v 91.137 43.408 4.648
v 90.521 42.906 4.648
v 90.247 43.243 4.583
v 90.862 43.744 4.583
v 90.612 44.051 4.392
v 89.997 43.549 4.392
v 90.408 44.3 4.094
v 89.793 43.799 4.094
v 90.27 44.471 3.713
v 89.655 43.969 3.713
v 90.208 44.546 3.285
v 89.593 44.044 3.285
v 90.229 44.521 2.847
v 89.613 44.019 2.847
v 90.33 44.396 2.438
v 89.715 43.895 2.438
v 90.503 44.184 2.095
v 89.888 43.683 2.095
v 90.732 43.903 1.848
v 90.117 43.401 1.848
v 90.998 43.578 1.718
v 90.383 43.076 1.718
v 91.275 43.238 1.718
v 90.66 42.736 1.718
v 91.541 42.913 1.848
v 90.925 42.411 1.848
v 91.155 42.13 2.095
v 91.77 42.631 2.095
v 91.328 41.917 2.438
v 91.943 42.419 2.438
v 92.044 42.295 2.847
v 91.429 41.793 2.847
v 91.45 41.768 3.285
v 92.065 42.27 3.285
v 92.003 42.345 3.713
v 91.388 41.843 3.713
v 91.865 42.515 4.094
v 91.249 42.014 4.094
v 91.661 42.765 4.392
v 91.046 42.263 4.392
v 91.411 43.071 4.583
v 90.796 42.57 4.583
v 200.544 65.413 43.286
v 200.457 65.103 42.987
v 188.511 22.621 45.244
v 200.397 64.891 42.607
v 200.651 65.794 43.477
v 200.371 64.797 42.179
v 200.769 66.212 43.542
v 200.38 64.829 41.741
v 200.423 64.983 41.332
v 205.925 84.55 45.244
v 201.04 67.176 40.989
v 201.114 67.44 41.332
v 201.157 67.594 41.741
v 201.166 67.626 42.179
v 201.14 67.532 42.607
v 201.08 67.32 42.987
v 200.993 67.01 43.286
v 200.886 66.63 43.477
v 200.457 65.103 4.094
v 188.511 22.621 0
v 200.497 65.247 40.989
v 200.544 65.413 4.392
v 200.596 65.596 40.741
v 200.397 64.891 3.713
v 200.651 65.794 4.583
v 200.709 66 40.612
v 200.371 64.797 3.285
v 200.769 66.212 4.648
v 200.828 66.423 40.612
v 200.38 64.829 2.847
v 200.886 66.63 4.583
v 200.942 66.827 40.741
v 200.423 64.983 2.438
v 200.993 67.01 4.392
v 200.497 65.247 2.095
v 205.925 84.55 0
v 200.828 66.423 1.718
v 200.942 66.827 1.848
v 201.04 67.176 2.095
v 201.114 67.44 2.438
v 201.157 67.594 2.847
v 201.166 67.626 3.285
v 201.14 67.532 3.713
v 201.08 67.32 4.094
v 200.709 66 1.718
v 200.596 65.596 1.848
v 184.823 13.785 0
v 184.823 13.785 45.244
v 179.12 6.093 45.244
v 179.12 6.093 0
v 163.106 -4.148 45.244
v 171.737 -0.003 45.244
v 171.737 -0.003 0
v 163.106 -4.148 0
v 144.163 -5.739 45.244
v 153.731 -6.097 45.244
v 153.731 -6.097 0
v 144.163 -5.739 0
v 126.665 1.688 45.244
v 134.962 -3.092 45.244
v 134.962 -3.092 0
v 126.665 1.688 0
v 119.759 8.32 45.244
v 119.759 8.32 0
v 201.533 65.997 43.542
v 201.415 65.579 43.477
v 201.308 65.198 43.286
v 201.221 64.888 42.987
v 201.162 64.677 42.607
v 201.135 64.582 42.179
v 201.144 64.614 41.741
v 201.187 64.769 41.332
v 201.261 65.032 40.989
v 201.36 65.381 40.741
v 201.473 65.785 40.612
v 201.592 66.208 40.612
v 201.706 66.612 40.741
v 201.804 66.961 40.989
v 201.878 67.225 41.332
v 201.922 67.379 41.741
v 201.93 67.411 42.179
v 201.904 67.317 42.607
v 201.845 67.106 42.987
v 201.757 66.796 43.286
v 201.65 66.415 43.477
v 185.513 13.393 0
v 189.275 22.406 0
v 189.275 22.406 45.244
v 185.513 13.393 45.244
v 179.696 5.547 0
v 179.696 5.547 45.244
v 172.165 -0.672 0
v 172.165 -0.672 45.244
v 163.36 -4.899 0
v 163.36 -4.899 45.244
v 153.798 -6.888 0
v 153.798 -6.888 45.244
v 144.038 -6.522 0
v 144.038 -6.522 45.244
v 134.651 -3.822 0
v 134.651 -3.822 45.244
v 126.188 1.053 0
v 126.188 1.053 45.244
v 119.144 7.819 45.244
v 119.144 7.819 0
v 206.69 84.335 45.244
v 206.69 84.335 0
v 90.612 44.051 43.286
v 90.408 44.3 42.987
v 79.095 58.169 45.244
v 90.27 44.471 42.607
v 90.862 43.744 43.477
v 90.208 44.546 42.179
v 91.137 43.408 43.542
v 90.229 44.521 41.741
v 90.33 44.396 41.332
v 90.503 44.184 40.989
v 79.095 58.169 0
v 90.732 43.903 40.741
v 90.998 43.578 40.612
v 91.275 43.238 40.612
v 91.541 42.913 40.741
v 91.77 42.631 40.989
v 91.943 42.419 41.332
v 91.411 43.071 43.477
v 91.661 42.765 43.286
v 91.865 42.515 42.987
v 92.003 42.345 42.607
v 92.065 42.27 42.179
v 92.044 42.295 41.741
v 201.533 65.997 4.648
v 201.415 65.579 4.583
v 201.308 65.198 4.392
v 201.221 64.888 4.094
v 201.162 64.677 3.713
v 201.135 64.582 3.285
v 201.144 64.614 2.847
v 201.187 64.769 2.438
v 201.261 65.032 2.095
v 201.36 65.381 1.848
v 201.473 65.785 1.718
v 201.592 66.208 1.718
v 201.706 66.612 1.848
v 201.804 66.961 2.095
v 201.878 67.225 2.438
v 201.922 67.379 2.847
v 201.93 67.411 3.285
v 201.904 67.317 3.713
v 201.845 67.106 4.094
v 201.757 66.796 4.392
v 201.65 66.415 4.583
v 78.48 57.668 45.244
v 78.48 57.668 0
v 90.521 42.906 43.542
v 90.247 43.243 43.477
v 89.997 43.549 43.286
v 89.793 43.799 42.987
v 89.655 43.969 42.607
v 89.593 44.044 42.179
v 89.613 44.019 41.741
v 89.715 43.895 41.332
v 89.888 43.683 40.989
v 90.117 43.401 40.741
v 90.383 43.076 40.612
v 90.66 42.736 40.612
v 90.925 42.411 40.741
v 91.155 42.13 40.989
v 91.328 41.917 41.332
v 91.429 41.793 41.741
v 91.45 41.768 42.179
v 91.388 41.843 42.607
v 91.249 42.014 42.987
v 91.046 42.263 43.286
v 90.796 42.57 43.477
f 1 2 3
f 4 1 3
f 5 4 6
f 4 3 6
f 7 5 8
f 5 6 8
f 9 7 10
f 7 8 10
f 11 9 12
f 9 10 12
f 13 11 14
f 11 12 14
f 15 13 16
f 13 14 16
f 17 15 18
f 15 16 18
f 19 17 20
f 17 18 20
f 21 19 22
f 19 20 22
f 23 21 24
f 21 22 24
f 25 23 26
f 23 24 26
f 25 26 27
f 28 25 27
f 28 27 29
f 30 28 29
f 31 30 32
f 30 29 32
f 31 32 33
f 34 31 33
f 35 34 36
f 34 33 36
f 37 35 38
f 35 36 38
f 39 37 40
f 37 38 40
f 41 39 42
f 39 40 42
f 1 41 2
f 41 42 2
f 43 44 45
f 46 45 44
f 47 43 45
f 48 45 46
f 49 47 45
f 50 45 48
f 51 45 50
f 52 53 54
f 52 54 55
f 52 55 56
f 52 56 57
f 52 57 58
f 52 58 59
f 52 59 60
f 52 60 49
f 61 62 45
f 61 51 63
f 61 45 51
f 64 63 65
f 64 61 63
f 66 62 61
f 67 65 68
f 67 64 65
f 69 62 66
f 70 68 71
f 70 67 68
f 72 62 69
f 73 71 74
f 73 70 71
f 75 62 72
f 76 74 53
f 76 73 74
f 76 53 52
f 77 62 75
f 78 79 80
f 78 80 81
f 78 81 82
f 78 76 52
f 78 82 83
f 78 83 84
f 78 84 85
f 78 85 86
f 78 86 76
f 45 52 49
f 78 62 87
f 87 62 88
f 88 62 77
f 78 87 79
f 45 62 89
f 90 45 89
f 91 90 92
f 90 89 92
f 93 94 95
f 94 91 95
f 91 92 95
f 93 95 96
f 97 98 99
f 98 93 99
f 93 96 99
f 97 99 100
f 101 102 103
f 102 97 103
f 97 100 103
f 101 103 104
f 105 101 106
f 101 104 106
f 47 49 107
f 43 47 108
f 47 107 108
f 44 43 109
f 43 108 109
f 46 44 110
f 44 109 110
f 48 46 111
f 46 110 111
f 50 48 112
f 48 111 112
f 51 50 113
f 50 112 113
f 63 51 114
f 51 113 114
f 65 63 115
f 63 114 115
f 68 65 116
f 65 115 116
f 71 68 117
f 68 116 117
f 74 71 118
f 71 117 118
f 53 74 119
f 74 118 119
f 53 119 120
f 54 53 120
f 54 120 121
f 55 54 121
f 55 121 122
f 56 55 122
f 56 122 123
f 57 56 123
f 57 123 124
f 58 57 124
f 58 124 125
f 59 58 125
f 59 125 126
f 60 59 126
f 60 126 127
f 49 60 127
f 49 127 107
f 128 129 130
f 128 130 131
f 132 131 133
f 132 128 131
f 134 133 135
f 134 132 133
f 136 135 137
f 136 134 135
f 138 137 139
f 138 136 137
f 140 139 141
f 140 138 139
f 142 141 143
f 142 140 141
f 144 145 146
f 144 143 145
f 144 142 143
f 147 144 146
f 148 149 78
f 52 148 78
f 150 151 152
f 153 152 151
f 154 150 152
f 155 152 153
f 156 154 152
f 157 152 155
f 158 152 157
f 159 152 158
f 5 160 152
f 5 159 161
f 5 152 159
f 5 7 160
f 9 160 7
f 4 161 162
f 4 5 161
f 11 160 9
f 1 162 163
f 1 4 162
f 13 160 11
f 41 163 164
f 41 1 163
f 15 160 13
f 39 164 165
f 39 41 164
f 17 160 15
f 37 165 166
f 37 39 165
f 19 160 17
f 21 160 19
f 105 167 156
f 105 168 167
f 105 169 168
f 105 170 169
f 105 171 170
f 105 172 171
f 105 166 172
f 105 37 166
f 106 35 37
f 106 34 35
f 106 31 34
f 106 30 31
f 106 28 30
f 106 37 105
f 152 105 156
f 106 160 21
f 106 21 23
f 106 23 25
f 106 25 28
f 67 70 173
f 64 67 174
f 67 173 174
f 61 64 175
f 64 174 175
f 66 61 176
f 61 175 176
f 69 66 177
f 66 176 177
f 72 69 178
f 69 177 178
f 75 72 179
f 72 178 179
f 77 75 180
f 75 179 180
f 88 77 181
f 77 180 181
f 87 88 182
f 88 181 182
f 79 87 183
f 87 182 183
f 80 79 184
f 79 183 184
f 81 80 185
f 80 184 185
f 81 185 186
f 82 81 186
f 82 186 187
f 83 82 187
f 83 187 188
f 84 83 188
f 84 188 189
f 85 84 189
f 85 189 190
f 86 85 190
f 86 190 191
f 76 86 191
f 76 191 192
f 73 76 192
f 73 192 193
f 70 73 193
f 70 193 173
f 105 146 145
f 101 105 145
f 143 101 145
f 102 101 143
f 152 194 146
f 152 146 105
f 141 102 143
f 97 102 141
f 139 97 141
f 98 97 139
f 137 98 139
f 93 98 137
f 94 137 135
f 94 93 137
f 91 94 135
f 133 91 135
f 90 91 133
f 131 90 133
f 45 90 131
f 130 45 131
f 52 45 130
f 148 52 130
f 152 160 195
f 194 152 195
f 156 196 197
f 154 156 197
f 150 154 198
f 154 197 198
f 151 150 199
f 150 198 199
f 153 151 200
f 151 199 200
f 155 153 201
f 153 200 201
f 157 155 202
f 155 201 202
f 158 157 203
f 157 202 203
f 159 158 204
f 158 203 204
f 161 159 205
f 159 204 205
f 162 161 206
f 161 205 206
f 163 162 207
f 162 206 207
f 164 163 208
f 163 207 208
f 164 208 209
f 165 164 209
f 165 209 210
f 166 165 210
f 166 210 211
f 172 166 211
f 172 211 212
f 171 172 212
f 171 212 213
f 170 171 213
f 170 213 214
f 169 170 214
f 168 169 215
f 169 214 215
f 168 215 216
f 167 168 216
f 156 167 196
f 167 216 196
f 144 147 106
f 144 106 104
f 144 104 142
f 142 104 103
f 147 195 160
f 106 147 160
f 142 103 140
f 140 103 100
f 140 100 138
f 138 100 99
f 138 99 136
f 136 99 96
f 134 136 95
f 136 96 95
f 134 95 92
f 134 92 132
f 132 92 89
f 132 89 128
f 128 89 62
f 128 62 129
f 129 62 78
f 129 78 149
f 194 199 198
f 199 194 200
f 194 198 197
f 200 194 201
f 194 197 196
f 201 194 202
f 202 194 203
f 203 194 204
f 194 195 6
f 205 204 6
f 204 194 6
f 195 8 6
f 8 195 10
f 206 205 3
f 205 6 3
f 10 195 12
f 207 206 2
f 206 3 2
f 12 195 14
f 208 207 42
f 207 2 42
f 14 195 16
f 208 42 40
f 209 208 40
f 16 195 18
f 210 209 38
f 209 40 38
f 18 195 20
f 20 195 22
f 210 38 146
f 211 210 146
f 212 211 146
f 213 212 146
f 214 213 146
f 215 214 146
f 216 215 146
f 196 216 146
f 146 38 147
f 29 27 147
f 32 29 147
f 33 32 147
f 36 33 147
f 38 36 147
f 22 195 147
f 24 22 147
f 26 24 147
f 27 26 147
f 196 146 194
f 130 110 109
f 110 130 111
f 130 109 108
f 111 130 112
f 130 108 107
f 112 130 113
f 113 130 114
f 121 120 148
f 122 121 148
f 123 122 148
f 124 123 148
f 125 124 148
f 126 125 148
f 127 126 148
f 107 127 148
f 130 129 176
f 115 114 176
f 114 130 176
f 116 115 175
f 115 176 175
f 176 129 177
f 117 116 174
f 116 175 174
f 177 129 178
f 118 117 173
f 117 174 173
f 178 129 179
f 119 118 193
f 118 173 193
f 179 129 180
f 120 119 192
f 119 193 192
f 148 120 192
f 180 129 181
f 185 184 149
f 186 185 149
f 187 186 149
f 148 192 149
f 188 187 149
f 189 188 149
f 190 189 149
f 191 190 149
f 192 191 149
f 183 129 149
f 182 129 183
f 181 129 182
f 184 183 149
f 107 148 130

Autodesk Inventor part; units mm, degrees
ref_plane "YZ Plane" through (0, 0, 0) normal (1, 0, 0) x (0, 1, 0)
ref_plane "XZ Plane" through (0, 0, 0) normal (0, 1, 0) x (-1, 0, 0)
sketch "Main Outline" plane through (0, 0, 0) normal (0, 0, 1) x (1, 0, 0)
  line L0 (0, 0) -> (304.8, 0) construction
  line L1 (304.8, 0) -> (304.8, 50.8) construction
  line L2 (304.8, 50.8) -> (0, 50.8) construction
  line L3 (0, 50.8) -> (0, 0) construction
  line L4 (0, 50.8) -> (0, 53.34) construction
  line L5 (0, 53.34) -> (304.8, 53.34) construction
  line L6 (304.8, 53.34) -> (304.8, 50.8) construction
  circle A0 centre (152.4, 23.8125) radius 17.4625 construction
  line L7 (152.4, 23.8125) -> (152.4, 0) construction
  circle A1 centre (152.4, 23.8125) radius 27.94 construction
  circle A2 centre (152.4, 23.8125) radius 21.59 construction
  line L8 (152.4, 23.8125) -> (144.7964, 60.3681) construction
  circle A3 centre (144.7964, 60.3681) radius 15.24 construction
  circle A4 centre (144.7964, 60.3681) radius 8.89 construction
  circle A5 centre (144.7964, 60.3681) radius 14.2875 construction
  arc A6 (164.6591, 71.8014) -> (129.0153, 43.7486) centre (144.7964, 60.3681) ccw construction
  circle A7 centre (98.8106, 85.598) radius 32.258 construction
  circle A8 centre (126.6733, 147.4971) radius 32.258 construction
  circle A9 centre (176.9075, 101.8424) radius 32.258 construction
  circle A10 centre (144.7964, 60.3681) radius 11.1125 construction
  circle A11 centre (152.4, 23.8125) radius 49.53 construction
  line L9 (144.7964, 60.3681) -> (126.6733, 147.4971) construction
  line L10 (144.7964, 60.3681) -> (98.8106, 85.598) construction
  line L11 (98.8106, 85.598) -> (176.9075, 101.8424) construction
  line L12 (176.9075, 101.8424) -> (144.7964, 60.3681) construction
  circle A12 centre (98.8106, 85.598) radius 9.5493 construction
  arc A13 (174.9629, 111.1915) -> (185.6989, 98.1139) centre (176.9075, 101.8424) ccw construction
  circle A14 centre (126.6733, 147.4971) radius 9.5493 construction
  line L13 (96.8659, 94.9472) -> (174.9629, 111.1915) construction
  line L14 (185.6989, 98.1139) -> (165.8956, 51.4198) construction
  line L15 (92.2351, 78.6732) -> (129.0153, 43.7486) construction
  line L16 (174.9629, 111.1915) -> (176.9075, 101.8424) construction
  line L17 (176.9075, 101.8424) -> (185.6989, 98.1139) construction
  arc A15 (185.6989, 98.1139) -> (174.9629, 111.1915) centre (176.9075, 101.8424) ccw construction
  arc A16 (165.8956, 51.4198) -> (164.6591, 71.8014) centre (144.7964, 60.3681) ccw construction
  arc A17 (129.0153, 43.7486) -> (165.8956, 51.4198) centre (144.7964, 60.3681) ccw construction
  circle A18 centre (126.6086, 147.808) radius 32.258 construction
  circle A19 centre (126.544, 148.1188) radius 32.258 construction
  circle A20 centre (126.4793, 148.4297) radius 32.258 construction
  line L18 (126.6733, 147.4971) -> (126.4793, 148.4297) construction
  circle A21 centre (126.738, 147.1863) radius 32.258 construction
  circle A22 centre (117.4622, 43.2997) radius 9.525 construction
  circle A23 centre (176.6694, 55.615) radius 9.525 construction
  line L19 (152.4, 23.8125) -> (117.4622, 43.2997) construction
  line L20 (152.4, 23.8125) -> (176.6694, 55.615) construction
  line L21 (117.4622, 43.2997) -> (98.8106, 85.598) construction
  line L22 (176.6694, 55.615) -> (176.9075, 101.8424) construction
  circle A24 centre (135.1821, 106.5897) radius 7.9375 construction
  line L23 (135.6243, 150.8242) -> (166.2787, 68.353) construction
  circle A25 centre (152.4, 23.8125) radius 29.845 construction
  line L24 (117.1381, 146.979) -> (121.9118, 59.1246) construction
  circle A26 centre (99.0889, 85.4453) radius 32.258 construction
  circle A27 centre (97.9755, 86.0562) radius 32.258 construction
  line L25 (97.9755, 86.0562) -> (98.8106, 85.598) construction
  circle A28 centre (98.2538, 85.9034) radius 32.258 construction
  circle A29 centre (98.5322, 85.7507) radius 32.258 construction
  circle A30 centre (152.4, 23.8125) radius 29.845 construction
  circle A31 centre (122.555, 23.8125) radius 6.35 construction
  circle A32 centre (179.7696, 35.7133) radius 6.35 construction
  line L26 (122.555, 23.8125) -> (152.4, 23.8125) construction
  line L27 (152.4, 23.8125) -> (182.245, 23.8125) construction
  circle A33 centre (182.245, 23.8125) radius 6.35 construction
  circle A34 centre (125.0304, 11.9117) radius 6.35 construction
  circle A35 centre (150.4199, 33.3321) radius 39.5684 construction
  line L28 (72.9795, 65.6655) -> (119.7593, 8.3204) construction
  circle A36 centre (177.4906, 102.5955) radius 32.258 construction
  line L29 (176.9075, 101.8424) -> (177.4906, 102.5955) construction
  circle A37 centre (177.2963, 102.3445) radius 32.258 construction
  circle A38 centre (177.1019, 102.0934) radius 32.258 construction
  circle A39 centre (176.7131, 101.5913) radius 32.258 construction
  line L30 (188.5109, 22.6209) -> (208.5442, 93.8632) construction
  circle A40 centre (135.1821, 106.5897) radius 9.5727 construction
  arc A41 (86.8202, 116.3239) -> (96.3065, 136.4856) centre (81.3304, 131.2195) ccw construction
  arc A42 (158.9123, 149.5077) -> (175.6513, 134.801) centre (174.7462, 150.6502) ccw construction
  line L31 (126.4793, 148.4297) -> (126.9966, 145.9429) construction
  line L32 (116.5322, 146.3607) -> (117.0495, 143.8739) construction
  line L33 (136.9437, 148.0119) -> (136.4264, 150.4987) construction
  arc A43 (136.4264, 150.4987) -> (116.5322, 146.3607) centre (126.4793, 148.4297) ccw construction
  arc A44 (117.0495, 143.8739) -> (136.9437, 148.0119) centre (126.9966, 145.9429) ccw construction
  line L34 (177.4906, 102.5955) -> (175.9357, 100.5871) construction
  line L35 (169.4571, 108.8154) -> (167.9021, 106.807) construction
  line L36 (183.9692, 94.3672) -> (185.5242, 96.3756) construction
  arc A45 (185.5242, 96.3756) -> (169.4571, 108.8154) centre (177.4906, 102.5955) ccw construction
  arc A46 (167.9021, 106.807) -> (183.9692, 94.3672) centre (175.9357, 100.5871) ccw construction
  line L37 (97.9755, 86.0562) -> (100.2023, 84.8344) construction
  line L38 (93.0884, 77.1487) -> (95.3153, 75.927) construction
  line L39 (105.0894, 93.7418) -> (102.8625, 94.9636) construction
  arc A47 (102.8625, 94.9636) -> (93.0884, 77.1487) centre (97.9755, 86.0562) ccw construction
  arc A48 (95.3153, 75.927) -> (105.0894, 93.7418) centre (100.2023, 84.8344) ccw construction
  circle A49 centre (117.4622, 43.2997) radius 3.9687 construction
  circle A50 centre (176.6694, 55.615) radius 3.9687 construction
  line L40 (152.4, 23.8125) -> (158.4777, -5.4071) construction
  arc A51 (80.1751, 59.3139) -> (79.0947, 58.1692) centre (79.7097, 58.6709) ccw construction
  arc A52 (205.9254, 84.5503) -> (204.4781, 85.1692) centre (205.1613, 84.7652) ccw construction
  circle A53 centre (152.4, 23.8125) radius 14.224 construction
  circle A54 centre (135.1821, 106.5897) radius 3.9687 construction
  circle A55 centre (156.538, 3.9183) radius 6.35 construction
  circle A56 centre (156.538, 3.9183) radius 2.0828 construction
  circle A57 centre (152.4, 23.8125) radius 20.32 construction
  line L41 (133.1021, 30.1759) -> (152.4, 23.8125) construction
  line L42 (152.4, 23.8125) -> (167.5599, 37.3432) construction
  circle A58 centre (167.5599, 37.3432) radius 2.0828 construction
  circle A59 centre (167.5599, 37.3432) radius 3.9687 construction
  circle A60 centre (133.1021, 30.1759) radius 2.0828 construction
  circle A61 centre (133.1021, 30.1759) radius 3.9688 construction
  point P0 (126.738, 147.1863)
  point P1 (176.7131, 101.5913)
  dimension "d18" = 99.06
  dimension "d58" = 64.516
  dimension "d86" = 64.516
  dimension "d0" = 304.8
  dimension "d1" = 50.8
  dimension "d2" = 2.54
  dimension "d3" = 34.925
  dimension "d4" = 23.8125
  dimension "d5" = 152.4
  dimension "d6" = 55.88
  dimension "d7" = 43.18
  dimension "d8" = 37.338
  dimension "d10" = 30.48
  dimension "d11" = 17.78
  dimension "d12" = 28.575
  dimension "d13" = 45.8366
  dimension "d14" = 64.516
  dimension "d15" = 64.516
  dimension "d16" = 64.516
  dimension "d17" = 22.225
  dimension "d19" = 52.4523
  dimension "d20" = 88.9939
  dimension "d21" = 19.0986
  dimension "d22" = 19.0986
  dimension "d23" = 19.0986
  dimension "d30" = 124.732
  dimension "d40" = 64.516
  dimension "d41" = 64.516
  dimension "d42" = 64.516
  dimension "d43" = 0.9525
  dimension "d44" = 0.3175
  dimension "d45" = 0.635
  dimension "d46" = 64.516
  dimension "d47" = 0.3175
  dimension "d48" = 19.05
  dimension "d49" = 19.05
  dimension "d50" = 40.005
  dimension "d51" = 40.005
  dimension "d52" = 46.228
  dimension "d54" = 46.228
  dimension "d55" = 15.875
  dimension "d56" = 41.4655
  dimension "d57" = 59.69
  dimension "d59" = 64.516
  dimension "d60" = 64.516
  dimension "d61" = 64.516
  dimension "d62" = 0.3175
  dimension "d63" = 0.3175
  dimension "d64" = 0.635
  dimension "d65" = 0.9525
  dimension "d73" = 12.7
  dimension "d74" = 12.7
  dimension "d76" = 59.69
  dimension "d78" = 12.7
  dimension "d79" = 12.7
  dimension "d80" = 64.516
  dimension "d81" = 0.9525
  dimension "d82" = 64.516
  dimension "d83" = 64.516
  dimension "d84" = 0.3175
  dimension "d85" = 0.635
  dimension "d88" = 0.3175
  dimension "d89" = 31.75
  dimension "d90" = 31.75
  dimension "d94" = 1.5875
  dimension "d95" = 20.32
  dimension "d96" = 1.5875
sketch "Upper CIM C-C Check" plane through (0, 0, 0) normal (0, 0, 1) x (1, 0, 0)
  arc A0 (3.4429, -22.6582) -> (3.4429, 22.6582) centre (0, 0) ccw construction
  arc A1 (90.4285, 9.4409) -> (90.4285, -9.4409) centre (88.9939, 0) ccw construction
  line L0 (88.9939, 0) -> (0, 0) construction
  line L1 (90.4285, 9.4409) -> (3.4429, 22.6582)
  line L2 (3.4429, -22.6582) -> (90.4285, -9.4409)
  arc A2 (90.4285, -9.4409) -> (90.4285, 9.4409) centre (88.9939, 0) ccw
  arc A3 (3.4429, 22.6582) -> (3.4429, -22.6582) centre (0, 0) ccw
  dimension "d24" = 45.8366
  dimension "d25" = 19.0986
  dimension "d26" = 78.9119
  dimension "d27" = 87.984
  dimension "d28" = 27.12
  dimension "d29" = 88.9939
sketch "Sketch3" plane through (0, 0, 0) normal (0, 0, 1) x (1, 0, 0)
  arc A0 (80.1751, 59.3139) -> (79.0947, 58.1692) centre (79.7097, 58.6709) ccw construction
  line L0 (72.9795, 65.6655) -> (119.7593, 8.3204) construction
  circle A1 centre (150.4199, 33.3321) radius 39.5684 construction
  line L1 (188.5109, 22.6209) -> (208.5442, 93.8632) construction
  arc A2 (205.9254, 84.5503) -> (204.4781, 85.1692) centre (205.1613, 84.7652) ccw construction
  line L2 (79.0947, 58.1692) -> (119.7593, 8.3204)
  line L3 (188.5109, 22.6209) -> (205.9254, 84.5503)
  arc A3 (119.7593, 8.3204) -> (188.5109, 22.6209) centre (150.4199, 33.3321) ccw
  line L4 (78.4796, 57.6675) -> (119.1442, 7.8187)
  arc A4 (119.1442, 7.8187) -> (189.275, 22.4061) centre (150.4199, 33.3321) ccw
  line L5 (189.275, 22.4061) -> (206.6896, 84.3354)
  line L6 (79.0947, 58.1692) -> (78.4796, 57.6675)
  line L7 (206.6896, 84.3354) -> (205.9254, 84.5503)
  point P0 (0, 0)
  dimension "d115" = 0.7937
extrude "Extrusion1" add sketch "Sketch3" along normal blind 45.2437
ref_plane "Work Plane1" through (144.7964, 60.3681, 0) normal (0.9790451, 0.2036437, 0) x (-0.2036437, 0.9790451, 0)
sketch "Sketch4" plane through (188.5109, 22.6209, 0) normal (-0.9626636, 0.2707007, 0) x (0, 0, 1)
  line L0 (0, 0) -> (0, 64.3313) projected
  line L1 (0, 0) -> (45.2437, 0) projected
  line L2 (45.2437, 64.3313) -> (45.2437, 0) projected
  line L3 (0, 64.3313) -> (45.2437, 64.3313) projected
  line L4 (3.175, 64.3313) -> (3.175, 0)
  line L5 (42.0688, 64.3313) -> (42.0688, 0)
  point P0 (0, -72.8064)
  point P1 (3.175, 45.2813)
  point P2 (42.0688, 45.2813)
  dimension "d119" = 3.175
  dimension "d120" = 3.175
  dimension "d121" = 19.05
  dimension "d122" = 19.05
hole "Hole1" at (200.7686, 66.2116, 3.175) at (200.7686, 66.2116, 42.0688) direction (0.9626636, -0.2707007, 0) diameter 2.9464 end through all clearance for "Flat Head Machine Screw (82)" size "#4" standard "Ansi Unified Screw Threads"
mirror "Mirror1" about plane through (144.7964, 60.3681, 0) normal (0.9790451, 0.2036437, 0) of "Hole1"
sketch "Sketch6" plane through (0, 0, 45.2437) normal (0, 0, 1) x (1, 0, 0)
  line L0 (119.7593, 8.3204) -> (79.0947, 58.1692) projected
  line L1 (79.0947, 58.1692) -> (78.4796, 57.6675) projected
  line L2 (78.4796, 57.6675) -> (119.1442, 7.8187) projected
  arc A0 (119.1442, 7.8187) -> (189.275, 22.4061) centre (150.4199, 33.3321) ccw projected
  line L3 (189.275, 22.4061) -> (206.6896, 84.3354) projected
  line L4 (206.6896, 84.3354) -> (205.9254, 84.5503) projected
  line L5 (205.9254, 84.5503) -> (188.5109, 22.6209) projected
  arc A1 (119.7593, 8.3204) -> (188.5109, 22.6209) centre (150.4199, 33.3321) ccw projected
  line L6 (46.0816, -65.5817) -> (259.8786, -42.4203)
  point P0 (0, 0)
  dimension "d135" = 86.3855
  dimension "d136" = 64.3312
  dimension "d137" = 215.048
equation "\"d3\" = r10"
equation "\"d6\" = g44"
equation "\"d7\" = g34"
equation "\"d10\" = g24"
equation "\"d11\" = g14"
equation "\"d12\" = r8"
equation "\"d13\" = p48"
equation "\"d14\" = cim"
equation "\"d15\" = cim"
equation "\"d16\" = cim"
equation "\"d17\" = r6"
equation "\"d21\" = p20"
equation "\"d22\" = p20"
equation "\"d23\" = p20"
equation "\"d24\" = p48"
equation "\"d25\" = p20"
equation "\"d29\" = d20"
equation "\"g14\" = 17.78"
equation "\"g24\" = 30.48"
equation "\"g34\" = 43.18"
equation "\"g44\" = 55.88"
equation "\"p20\" = 19.09859"
equation "\"p48\" = 45.83662"
equation "\"r10\" = 34.925"
equation "\"r9\" = 31.75"
equation "\"r8\" = 28.575"
equation "\"r7\" = 25.4"
equation "\"r6\" = 22.225"
equation "\"r5\" = 19.05"
equation "\"r4\" = 15.875"
equation "\"r3\" = 12.7"
equation "\"cim\" = 64.516"
equation "\"act\" = 28.448"
equation "\"actL\" = 23.749"
equation "\"UpperCimCCCheck\" = 2 * d27 + d26 + d28"
equation "\"LowerBeltPathCCCheck\" = 267"
equation "\"SheildArc\" = 215.04798"
properties material "Aluminum 6061"
